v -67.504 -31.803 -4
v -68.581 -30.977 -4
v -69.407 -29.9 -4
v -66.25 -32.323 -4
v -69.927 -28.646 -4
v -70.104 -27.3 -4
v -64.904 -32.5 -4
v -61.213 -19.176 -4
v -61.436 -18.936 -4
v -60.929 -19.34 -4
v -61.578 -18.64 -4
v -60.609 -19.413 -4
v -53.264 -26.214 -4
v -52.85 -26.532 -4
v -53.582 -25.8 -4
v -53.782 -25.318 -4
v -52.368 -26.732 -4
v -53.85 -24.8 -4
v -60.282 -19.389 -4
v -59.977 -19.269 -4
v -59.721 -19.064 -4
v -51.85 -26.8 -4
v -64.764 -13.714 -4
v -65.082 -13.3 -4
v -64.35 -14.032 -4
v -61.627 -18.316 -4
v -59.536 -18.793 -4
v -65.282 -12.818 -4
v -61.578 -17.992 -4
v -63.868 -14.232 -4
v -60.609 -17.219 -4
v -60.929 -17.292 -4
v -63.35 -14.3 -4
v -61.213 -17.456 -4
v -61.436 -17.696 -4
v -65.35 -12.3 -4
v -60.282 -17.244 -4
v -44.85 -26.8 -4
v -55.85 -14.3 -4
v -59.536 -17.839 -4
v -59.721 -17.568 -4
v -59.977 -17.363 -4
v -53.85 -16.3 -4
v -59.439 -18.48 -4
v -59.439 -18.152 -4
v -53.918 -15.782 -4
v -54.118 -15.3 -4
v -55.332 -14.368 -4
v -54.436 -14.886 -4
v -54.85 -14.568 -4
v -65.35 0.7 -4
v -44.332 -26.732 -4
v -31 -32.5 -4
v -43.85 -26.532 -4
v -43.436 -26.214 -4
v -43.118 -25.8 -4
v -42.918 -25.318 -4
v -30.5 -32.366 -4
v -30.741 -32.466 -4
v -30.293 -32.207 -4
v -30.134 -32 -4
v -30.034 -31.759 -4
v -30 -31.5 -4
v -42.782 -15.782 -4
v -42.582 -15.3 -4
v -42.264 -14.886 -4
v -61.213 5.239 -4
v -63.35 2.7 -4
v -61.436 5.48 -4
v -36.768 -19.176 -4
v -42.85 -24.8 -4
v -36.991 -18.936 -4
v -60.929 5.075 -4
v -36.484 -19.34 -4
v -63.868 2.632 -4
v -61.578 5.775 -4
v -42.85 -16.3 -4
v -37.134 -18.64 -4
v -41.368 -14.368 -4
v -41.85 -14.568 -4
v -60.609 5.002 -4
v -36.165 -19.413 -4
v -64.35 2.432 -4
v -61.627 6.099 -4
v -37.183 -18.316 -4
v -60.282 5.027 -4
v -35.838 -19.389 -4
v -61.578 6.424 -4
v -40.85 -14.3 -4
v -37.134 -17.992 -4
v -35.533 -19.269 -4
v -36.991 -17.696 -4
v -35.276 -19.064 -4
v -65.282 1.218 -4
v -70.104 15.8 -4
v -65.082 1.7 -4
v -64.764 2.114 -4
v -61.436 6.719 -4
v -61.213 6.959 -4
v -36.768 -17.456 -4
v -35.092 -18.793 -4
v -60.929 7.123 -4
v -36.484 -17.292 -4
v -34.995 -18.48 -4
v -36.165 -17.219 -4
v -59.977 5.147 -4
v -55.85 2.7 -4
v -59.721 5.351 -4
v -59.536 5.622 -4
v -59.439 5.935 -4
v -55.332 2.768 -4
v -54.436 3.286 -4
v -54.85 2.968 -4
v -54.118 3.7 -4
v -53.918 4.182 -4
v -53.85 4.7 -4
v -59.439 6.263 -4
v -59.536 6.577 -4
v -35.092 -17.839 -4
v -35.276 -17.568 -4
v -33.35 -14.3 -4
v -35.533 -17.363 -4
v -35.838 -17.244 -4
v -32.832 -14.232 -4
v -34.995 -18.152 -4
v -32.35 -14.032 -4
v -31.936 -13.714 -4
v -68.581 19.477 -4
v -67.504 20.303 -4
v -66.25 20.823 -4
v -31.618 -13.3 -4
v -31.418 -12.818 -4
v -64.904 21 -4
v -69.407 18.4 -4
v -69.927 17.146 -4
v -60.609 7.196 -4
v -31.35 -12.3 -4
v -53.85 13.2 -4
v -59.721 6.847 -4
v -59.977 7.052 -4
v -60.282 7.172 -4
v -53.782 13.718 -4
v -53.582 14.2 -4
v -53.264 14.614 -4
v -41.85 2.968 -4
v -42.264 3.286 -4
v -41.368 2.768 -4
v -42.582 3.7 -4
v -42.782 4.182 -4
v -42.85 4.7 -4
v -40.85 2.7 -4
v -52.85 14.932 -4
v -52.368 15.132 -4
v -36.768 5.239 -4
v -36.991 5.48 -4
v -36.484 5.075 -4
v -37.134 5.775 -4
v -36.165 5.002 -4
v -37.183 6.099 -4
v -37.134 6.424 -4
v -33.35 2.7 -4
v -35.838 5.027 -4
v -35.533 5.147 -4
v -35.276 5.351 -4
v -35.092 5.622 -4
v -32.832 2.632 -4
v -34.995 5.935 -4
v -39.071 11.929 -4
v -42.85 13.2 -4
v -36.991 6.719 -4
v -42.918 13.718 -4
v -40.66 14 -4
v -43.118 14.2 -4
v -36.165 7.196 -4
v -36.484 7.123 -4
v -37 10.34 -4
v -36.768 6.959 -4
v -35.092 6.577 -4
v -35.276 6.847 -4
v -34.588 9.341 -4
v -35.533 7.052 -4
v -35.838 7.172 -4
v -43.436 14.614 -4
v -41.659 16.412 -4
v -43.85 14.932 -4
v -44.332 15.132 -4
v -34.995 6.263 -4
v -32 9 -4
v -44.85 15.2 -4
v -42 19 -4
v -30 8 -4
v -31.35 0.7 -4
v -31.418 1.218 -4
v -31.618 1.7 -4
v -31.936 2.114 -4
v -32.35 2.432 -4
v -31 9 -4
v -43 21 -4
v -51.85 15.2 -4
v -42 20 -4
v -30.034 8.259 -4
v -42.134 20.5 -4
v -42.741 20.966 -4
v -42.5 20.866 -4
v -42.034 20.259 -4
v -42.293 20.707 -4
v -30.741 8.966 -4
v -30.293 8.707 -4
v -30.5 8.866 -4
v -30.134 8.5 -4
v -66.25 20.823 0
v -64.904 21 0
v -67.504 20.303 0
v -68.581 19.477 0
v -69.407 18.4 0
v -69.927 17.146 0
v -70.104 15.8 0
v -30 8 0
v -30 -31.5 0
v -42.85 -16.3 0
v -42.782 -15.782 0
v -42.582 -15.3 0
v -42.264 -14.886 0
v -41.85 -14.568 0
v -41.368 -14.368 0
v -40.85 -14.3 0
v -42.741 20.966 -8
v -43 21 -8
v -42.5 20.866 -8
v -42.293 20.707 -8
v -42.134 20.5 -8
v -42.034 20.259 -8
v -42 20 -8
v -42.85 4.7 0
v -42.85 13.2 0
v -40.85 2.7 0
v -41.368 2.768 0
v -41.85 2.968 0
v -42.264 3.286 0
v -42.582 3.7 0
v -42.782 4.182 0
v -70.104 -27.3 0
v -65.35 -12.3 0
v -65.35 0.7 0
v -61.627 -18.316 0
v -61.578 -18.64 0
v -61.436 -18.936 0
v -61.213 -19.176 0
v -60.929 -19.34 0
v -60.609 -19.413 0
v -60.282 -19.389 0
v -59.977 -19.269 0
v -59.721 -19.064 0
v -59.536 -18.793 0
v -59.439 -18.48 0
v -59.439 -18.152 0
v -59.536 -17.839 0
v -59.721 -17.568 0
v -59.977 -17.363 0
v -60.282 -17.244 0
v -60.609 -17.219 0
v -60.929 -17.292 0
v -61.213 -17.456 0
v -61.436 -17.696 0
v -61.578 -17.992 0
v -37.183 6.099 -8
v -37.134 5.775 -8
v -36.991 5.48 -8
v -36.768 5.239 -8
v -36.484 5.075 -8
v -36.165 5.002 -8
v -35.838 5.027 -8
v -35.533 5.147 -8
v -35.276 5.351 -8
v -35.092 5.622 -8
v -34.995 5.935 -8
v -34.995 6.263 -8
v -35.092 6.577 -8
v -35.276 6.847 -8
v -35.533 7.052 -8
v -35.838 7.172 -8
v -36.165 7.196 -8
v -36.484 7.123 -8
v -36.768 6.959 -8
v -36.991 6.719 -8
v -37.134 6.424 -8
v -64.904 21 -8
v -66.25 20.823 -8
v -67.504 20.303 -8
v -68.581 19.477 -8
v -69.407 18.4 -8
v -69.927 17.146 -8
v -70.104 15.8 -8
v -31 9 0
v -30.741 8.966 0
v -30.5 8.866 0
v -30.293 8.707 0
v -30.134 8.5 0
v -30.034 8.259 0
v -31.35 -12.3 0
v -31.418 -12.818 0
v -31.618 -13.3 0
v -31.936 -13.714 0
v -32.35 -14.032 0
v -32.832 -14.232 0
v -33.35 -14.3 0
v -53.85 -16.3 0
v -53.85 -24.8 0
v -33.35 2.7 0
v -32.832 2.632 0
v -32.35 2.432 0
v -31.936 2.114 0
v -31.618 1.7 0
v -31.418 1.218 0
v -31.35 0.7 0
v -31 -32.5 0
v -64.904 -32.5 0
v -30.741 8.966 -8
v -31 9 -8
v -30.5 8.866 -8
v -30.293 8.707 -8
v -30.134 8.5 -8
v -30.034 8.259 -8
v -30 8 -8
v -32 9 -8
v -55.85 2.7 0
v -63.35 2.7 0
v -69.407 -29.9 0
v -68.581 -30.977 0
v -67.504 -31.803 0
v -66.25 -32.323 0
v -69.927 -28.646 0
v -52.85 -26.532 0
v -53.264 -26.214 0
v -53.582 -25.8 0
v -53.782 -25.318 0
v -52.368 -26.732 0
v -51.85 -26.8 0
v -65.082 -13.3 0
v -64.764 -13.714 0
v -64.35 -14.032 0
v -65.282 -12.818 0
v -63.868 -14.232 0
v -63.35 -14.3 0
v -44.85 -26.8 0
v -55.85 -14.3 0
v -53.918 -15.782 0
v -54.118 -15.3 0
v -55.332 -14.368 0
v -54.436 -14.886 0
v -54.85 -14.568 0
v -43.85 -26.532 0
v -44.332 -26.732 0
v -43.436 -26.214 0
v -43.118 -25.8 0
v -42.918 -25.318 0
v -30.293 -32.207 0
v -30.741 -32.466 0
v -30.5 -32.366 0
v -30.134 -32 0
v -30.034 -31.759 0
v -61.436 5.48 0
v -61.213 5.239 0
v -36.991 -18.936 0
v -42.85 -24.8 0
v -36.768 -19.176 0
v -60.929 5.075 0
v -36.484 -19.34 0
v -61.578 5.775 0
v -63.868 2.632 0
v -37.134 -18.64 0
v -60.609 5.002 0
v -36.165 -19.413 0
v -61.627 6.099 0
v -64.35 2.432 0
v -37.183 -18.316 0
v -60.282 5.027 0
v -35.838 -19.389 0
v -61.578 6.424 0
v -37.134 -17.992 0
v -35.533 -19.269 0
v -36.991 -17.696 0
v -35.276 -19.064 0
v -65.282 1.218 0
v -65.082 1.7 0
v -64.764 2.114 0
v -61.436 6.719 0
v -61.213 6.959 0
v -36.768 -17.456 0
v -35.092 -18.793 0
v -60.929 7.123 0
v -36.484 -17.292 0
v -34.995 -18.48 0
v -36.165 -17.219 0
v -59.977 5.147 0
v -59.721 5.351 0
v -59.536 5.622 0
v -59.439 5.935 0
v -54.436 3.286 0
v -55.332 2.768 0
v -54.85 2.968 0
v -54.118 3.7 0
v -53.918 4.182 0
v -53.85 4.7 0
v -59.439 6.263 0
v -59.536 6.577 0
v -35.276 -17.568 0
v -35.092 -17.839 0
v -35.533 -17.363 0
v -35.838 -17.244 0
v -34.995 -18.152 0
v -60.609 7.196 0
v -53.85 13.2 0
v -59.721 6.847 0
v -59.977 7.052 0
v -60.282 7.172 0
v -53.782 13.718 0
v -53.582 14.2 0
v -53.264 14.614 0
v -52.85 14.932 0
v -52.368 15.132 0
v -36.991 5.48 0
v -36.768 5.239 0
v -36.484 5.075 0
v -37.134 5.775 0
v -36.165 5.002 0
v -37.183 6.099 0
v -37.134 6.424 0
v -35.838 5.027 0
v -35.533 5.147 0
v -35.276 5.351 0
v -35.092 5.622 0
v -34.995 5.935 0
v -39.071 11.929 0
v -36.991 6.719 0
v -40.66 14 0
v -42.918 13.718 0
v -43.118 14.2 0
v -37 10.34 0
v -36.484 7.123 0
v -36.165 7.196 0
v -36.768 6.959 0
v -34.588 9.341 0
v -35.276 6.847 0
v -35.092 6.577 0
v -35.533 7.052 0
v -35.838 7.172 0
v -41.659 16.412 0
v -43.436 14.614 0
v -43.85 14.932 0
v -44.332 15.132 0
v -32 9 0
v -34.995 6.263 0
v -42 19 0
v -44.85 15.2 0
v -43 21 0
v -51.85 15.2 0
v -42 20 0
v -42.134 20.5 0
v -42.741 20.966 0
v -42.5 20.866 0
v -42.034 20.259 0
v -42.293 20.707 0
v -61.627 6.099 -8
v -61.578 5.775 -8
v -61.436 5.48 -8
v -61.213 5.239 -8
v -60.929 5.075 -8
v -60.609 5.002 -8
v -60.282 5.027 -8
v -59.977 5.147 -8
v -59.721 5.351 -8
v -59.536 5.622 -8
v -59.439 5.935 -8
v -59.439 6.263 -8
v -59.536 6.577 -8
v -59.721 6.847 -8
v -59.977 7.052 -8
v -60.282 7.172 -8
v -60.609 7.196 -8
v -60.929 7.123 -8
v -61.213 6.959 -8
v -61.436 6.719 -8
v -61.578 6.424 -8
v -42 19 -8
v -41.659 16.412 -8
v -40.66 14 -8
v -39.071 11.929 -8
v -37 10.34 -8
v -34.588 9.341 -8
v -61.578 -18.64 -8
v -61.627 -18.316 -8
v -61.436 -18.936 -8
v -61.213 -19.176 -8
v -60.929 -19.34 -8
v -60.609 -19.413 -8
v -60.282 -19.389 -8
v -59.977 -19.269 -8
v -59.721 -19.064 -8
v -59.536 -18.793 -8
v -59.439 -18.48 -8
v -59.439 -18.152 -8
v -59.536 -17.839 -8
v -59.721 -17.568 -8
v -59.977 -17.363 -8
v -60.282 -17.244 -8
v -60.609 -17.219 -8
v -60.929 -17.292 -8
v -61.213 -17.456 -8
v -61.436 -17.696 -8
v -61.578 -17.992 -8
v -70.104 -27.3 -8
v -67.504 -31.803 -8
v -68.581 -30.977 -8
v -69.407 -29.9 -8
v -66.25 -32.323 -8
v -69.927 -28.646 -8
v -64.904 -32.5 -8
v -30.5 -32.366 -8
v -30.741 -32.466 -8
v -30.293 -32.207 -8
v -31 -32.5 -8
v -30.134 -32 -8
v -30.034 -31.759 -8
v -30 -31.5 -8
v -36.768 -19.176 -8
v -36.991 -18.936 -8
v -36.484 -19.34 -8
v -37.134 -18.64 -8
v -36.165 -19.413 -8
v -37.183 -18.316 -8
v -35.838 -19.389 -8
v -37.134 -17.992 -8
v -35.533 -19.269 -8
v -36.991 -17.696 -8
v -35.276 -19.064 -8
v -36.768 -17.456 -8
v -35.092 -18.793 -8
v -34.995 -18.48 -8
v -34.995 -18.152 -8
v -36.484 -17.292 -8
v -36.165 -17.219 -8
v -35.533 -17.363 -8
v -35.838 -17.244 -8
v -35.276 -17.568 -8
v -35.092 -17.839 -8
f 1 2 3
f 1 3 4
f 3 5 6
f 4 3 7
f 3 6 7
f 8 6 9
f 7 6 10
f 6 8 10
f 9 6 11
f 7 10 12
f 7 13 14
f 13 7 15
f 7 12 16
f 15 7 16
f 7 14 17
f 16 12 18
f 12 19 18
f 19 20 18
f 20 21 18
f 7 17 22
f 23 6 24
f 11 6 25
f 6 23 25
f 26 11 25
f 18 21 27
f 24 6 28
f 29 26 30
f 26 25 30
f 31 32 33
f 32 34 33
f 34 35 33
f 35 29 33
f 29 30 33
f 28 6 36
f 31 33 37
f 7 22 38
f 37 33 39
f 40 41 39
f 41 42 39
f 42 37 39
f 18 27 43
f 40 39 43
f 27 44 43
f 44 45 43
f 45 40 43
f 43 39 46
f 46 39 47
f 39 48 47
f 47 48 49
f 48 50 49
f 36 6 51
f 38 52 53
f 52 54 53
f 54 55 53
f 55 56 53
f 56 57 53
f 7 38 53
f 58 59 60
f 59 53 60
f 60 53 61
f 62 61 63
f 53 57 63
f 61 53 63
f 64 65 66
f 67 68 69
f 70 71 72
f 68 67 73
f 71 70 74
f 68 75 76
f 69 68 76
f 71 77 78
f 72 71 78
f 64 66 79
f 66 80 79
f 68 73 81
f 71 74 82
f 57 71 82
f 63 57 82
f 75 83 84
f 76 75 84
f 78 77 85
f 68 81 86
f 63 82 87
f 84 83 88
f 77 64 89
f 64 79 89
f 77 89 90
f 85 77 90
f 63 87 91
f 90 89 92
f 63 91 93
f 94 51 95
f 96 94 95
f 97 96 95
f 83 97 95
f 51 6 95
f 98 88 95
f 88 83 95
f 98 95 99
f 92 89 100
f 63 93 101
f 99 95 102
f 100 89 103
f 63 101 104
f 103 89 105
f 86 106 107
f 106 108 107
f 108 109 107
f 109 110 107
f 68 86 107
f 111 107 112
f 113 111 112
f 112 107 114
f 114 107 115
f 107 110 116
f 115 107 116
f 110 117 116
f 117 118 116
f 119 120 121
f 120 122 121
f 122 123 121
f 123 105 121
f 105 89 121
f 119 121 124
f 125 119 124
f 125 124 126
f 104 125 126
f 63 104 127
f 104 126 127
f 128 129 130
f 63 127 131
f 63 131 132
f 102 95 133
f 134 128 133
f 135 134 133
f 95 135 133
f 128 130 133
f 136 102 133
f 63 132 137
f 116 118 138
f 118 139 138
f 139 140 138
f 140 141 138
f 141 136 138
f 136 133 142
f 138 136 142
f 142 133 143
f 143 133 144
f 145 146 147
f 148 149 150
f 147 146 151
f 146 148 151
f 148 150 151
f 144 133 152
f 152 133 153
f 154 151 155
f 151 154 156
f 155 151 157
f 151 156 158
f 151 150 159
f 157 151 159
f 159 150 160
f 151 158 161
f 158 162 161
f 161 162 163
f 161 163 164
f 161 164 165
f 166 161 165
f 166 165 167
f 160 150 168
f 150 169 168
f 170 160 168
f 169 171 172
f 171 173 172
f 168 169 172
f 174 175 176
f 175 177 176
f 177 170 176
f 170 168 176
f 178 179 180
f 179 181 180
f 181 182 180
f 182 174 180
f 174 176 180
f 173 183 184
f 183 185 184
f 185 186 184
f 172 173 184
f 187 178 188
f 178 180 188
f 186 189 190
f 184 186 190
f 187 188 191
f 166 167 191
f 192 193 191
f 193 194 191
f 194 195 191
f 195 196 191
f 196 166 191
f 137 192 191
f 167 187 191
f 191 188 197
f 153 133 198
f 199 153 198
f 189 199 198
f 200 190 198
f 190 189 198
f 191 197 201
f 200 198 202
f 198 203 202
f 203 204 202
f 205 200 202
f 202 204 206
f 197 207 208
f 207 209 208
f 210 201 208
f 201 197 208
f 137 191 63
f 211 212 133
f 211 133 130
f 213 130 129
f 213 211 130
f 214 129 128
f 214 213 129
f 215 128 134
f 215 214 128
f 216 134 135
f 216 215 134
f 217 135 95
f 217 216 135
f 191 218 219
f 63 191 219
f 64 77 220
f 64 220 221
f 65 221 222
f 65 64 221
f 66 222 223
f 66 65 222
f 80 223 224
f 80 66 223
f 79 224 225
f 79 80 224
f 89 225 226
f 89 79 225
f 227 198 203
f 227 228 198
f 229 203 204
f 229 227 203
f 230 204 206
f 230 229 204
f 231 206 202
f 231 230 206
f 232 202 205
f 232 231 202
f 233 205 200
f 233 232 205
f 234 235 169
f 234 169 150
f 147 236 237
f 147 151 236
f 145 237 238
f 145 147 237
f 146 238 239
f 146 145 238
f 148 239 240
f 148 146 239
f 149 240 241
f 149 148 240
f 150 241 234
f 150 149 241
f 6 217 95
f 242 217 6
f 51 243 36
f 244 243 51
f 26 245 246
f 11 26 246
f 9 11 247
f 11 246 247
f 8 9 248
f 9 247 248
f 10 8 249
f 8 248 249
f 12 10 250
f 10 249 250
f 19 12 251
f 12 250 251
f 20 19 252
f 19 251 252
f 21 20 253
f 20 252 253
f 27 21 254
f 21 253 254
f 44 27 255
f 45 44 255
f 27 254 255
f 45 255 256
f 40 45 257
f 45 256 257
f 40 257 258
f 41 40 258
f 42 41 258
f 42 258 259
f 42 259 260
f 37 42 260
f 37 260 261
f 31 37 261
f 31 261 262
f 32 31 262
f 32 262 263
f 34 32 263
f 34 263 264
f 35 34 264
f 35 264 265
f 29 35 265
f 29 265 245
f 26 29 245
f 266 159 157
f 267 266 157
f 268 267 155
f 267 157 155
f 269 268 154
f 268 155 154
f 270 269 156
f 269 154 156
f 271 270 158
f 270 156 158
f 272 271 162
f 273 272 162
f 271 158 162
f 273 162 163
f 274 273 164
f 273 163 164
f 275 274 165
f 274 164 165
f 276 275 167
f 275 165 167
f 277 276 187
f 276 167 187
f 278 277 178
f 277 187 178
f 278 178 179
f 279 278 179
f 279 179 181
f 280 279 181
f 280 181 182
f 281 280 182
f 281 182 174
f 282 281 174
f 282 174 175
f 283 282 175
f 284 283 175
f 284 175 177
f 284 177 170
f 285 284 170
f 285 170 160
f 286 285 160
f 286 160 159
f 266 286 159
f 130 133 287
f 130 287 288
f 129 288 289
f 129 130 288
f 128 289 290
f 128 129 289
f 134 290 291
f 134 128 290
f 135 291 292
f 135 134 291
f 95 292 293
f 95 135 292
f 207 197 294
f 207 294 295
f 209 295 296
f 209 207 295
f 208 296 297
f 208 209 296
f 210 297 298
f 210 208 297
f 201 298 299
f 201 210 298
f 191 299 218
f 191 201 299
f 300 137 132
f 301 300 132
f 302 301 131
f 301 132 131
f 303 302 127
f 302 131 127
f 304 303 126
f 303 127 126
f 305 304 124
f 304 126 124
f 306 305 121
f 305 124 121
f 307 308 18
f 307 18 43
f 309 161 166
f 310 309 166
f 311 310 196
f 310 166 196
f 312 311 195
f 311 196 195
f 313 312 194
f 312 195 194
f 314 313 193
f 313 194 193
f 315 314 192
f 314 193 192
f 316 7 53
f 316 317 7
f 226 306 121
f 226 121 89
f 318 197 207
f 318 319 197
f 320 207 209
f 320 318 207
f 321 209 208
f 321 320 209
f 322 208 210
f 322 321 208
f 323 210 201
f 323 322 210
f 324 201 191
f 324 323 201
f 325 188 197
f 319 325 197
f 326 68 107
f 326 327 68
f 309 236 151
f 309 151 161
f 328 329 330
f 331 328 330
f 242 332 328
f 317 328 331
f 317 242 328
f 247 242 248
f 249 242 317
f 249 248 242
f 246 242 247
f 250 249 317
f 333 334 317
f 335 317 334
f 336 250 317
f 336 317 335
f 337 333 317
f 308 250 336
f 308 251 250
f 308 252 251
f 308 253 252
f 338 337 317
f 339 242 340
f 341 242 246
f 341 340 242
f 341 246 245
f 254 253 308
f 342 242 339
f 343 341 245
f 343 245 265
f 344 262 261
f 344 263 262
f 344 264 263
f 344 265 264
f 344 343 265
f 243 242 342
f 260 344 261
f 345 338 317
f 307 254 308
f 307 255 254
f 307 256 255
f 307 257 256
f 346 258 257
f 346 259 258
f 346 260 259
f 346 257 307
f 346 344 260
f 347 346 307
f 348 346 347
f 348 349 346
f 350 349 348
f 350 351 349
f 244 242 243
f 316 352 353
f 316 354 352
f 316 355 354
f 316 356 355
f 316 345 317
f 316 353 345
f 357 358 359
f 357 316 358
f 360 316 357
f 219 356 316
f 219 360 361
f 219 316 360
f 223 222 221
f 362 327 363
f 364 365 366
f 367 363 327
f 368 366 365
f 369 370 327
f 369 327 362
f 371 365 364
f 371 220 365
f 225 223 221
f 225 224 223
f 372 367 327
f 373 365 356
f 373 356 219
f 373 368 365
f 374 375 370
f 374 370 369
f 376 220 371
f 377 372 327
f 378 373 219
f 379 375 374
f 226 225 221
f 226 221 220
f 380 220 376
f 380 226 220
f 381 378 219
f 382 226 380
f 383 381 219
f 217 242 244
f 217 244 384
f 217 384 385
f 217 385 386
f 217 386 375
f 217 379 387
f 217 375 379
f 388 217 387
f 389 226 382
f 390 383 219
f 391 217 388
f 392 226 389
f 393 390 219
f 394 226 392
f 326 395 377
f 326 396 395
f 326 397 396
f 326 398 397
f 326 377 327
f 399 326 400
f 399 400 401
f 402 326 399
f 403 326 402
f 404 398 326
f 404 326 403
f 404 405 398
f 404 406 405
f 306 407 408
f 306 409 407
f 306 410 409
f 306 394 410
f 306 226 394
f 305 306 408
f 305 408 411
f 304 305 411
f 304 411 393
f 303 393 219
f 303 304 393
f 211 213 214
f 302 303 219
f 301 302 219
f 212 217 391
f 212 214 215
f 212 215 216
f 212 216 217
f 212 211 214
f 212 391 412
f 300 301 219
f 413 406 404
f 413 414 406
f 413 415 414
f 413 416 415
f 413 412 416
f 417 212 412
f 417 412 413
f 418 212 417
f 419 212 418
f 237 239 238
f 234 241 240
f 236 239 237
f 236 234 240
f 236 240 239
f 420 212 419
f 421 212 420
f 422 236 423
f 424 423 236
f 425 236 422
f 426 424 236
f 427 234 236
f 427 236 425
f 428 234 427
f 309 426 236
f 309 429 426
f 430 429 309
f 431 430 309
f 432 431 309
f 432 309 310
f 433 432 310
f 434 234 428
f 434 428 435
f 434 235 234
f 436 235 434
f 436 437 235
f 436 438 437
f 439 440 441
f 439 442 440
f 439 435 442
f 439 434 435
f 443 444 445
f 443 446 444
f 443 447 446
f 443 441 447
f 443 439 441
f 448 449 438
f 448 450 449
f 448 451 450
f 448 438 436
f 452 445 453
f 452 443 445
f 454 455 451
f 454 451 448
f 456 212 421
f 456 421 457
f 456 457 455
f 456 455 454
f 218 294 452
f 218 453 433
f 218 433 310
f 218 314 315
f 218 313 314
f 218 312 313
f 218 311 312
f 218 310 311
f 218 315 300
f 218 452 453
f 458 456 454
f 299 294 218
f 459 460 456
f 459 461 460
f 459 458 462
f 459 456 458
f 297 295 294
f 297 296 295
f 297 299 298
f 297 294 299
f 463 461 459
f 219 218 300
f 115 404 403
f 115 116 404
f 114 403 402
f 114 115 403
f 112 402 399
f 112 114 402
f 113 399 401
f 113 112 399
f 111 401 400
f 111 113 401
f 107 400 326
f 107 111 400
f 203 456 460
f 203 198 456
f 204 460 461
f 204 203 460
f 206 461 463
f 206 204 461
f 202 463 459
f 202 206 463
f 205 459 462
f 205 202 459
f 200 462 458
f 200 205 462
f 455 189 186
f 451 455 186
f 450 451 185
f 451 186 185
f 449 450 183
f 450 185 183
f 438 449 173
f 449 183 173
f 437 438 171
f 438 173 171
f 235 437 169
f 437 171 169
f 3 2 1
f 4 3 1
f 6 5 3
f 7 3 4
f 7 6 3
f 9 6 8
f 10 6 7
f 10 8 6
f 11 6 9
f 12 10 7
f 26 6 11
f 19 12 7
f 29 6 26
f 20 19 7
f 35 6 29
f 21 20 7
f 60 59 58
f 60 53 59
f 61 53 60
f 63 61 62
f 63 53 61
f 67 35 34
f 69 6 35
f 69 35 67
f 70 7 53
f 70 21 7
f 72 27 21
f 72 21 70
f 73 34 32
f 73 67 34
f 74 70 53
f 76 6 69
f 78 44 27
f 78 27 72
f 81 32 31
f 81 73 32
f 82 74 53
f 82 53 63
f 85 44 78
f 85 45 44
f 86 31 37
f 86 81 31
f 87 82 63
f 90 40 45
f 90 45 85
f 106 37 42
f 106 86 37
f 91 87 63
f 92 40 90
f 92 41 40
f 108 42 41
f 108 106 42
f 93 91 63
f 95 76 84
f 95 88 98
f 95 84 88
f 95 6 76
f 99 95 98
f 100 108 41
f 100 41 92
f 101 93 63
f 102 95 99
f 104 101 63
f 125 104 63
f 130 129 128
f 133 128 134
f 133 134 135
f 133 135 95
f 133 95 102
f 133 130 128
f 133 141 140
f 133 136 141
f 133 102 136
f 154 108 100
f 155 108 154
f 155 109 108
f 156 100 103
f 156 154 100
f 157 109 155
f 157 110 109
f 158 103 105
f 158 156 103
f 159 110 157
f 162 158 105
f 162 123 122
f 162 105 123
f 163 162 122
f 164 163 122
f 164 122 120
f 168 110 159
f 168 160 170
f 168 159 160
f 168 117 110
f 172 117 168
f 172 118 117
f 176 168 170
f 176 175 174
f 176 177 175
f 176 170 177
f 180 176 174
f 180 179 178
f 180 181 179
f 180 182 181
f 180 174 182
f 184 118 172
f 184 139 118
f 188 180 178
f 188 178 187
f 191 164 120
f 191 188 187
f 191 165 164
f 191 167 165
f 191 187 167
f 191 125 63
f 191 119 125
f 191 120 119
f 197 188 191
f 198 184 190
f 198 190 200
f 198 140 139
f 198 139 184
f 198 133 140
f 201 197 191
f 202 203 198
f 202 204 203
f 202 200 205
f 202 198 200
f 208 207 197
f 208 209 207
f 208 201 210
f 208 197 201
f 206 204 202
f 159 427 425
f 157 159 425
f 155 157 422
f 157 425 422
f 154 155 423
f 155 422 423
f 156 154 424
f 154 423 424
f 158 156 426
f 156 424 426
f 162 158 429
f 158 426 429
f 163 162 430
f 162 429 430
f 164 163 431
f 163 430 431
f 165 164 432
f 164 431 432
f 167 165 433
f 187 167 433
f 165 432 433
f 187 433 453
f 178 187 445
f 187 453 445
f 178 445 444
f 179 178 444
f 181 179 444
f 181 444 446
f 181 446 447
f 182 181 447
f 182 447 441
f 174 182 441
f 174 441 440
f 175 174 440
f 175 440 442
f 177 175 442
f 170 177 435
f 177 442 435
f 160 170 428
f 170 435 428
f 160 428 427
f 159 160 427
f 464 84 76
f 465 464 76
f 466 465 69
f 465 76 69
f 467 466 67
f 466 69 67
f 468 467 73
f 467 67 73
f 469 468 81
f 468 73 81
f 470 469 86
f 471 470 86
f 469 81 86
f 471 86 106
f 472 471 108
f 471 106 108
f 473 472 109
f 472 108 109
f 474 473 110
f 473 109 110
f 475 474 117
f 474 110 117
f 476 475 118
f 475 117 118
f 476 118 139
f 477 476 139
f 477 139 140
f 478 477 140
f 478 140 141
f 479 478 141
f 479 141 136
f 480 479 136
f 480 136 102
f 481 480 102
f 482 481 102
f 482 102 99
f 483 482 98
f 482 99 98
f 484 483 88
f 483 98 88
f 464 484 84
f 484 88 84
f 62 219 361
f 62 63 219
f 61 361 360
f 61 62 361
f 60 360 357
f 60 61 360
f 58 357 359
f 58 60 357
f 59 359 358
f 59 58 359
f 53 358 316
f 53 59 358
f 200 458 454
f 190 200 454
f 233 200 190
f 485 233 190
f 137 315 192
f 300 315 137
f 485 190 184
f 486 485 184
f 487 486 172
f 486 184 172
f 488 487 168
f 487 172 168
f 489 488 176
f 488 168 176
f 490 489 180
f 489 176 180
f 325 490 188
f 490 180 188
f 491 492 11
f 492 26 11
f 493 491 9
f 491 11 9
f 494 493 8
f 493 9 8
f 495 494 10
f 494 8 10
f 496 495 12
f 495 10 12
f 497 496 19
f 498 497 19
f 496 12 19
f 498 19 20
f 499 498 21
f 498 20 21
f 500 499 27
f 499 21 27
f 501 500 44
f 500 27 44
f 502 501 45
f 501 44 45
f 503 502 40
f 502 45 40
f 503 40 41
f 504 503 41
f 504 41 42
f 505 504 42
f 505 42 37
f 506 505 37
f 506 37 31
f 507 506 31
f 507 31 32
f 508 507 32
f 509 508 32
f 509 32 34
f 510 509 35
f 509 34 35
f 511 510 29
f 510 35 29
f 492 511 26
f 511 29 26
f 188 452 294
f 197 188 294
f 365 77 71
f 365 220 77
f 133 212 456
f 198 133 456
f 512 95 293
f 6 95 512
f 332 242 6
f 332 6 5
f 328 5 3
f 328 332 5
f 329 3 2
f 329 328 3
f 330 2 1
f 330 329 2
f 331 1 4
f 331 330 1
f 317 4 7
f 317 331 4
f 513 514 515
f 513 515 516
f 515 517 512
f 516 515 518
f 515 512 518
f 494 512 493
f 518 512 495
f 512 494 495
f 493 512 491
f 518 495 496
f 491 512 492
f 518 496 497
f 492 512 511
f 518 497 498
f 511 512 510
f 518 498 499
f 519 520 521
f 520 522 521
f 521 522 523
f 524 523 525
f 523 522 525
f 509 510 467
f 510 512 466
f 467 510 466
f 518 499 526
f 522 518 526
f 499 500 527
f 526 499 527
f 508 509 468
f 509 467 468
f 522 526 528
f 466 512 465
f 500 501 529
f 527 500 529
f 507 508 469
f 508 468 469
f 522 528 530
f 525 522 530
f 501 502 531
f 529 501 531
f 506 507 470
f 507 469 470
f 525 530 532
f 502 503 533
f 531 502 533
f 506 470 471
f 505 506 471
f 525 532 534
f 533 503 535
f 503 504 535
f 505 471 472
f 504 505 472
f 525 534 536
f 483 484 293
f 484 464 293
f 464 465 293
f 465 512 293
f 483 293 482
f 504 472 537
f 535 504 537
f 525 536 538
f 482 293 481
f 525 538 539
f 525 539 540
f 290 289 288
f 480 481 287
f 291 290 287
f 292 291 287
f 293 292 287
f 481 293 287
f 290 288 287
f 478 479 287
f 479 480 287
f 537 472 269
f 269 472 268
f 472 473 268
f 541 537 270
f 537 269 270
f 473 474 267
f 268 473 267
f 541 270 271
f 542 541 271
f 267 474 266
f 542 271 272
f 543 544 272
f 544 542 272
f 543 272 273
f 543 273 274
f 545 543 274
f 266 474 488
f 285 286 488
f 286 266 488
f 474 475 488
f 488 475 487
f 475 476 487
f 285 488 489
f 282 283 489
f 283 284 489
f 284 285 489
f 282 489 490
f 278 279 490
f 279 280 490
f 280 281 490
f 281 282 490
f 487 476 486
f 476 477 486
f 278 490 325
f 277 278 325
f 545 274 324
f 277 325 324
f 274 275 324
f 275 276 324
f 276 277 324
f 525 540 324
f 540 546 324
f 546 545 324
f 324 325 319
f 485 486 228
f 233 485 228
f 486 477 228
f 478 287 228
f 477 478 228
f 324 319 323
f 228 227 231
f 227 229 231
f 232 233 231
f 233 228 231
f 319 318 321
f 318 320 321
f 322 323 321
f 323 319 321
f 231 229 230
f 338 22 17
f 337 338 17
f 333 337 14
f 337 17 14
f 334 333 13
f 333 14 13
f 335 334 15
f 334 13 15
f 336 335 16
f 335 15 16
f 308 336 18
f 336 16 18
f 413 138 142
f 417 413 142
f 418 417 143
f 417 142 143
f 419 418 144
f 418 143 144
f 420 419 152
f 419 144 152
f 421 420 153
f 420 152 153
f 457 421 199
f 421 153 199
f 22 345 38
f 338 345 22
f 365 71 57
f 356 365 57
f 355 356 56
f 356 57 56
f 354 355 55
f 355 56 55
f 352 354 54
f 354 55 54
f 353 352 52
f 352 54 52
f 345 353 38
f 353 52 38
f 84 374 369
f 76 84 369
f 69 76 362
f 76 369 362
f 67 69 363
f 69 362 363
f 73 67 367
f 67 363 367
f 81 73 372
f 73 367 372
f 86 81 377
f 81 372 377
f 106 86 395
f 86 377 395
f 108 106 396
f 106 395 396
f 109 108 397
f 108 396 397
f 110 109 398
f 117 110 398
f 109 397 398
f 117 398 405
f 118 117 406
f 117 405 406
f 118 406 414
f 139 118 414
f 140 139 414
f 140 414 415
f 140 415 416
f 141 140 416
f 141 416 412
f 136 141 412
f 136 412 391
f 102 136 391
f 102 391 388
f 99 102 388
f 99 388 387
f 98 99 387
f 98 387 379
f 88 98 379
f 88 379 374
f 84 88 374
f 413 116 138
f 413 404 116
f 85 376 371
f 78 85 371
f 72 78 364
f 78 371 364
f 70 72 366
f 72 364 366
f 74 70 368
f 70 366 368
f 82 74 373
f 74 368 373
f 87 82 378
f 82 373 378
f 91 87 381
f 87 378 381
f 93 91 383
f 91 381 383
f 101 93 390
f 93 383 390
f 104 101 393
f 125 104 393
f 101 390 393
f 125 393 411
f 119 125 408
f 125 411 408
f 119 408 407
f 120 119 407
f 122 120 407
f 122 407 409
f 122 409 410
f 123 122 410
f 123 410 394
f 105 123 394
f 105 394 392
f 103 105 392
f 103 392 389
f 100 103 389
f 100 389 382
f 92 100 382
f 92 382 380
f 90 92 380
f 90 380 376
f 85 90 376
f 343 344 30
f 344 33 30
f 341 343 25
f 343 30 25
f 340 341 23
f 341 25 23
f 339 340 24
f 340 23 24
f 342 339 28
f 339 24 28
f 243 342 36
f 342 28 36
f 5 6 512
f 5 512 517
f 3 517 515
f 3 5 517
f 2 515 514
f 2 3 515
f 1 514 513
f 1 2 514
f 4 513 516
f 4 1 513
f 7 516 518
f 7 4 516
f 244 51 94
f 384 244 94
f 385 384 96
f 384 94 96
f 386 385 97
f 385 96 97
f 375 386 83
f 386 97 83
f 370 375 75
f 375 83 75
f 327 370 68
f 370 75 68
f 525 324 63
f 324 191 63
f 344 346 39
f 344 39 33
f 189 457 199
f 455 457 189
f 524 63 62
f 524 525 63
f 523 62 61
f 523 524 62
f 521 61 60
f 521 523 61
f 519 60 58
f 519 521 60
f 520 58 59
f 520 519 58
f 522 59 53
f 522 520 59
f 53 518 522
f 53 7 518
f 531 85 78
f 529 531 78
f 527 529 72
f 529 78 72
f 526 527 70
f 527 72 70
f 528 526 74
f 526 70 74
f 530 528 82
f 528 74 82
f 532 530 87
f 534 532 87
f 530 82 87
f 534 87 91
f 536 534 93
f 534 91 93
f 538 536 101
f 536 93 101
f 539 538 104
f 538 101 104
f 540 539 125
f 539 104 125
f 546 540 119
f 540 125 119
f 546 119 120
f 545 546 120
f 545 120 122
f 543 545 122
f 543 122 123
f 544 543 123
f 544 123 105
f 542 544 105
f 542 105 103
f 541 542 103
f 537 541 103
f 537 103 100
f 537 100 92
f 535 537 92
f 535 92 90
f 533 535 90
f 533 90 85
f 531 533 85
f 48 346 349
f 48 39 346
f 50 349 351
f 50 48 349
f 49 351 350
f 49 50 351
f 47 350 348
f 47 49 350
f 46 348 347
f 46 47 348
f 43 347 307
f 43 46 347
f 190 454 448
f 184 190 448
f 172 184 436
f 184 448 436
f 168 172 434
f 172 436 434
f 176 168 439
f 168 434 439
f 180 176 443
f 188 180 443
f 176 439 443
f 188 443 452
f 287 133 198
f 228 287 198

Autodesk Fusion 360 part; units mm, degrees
sketch "Sketch2" plane through (0, 0, 0) normal (0, 0, 1) x (1, 0, 0)
  line L0 (70.104, -32.512) -> (-70.104, -32.512)
  line L1 (-70.104, -32.512) -> (-70.104, 32.512)
  line L2 (-70.104, 32.512) -> (70.104, 32.512)
  line L3 (70.104, 32.512) -> (70.104, -32.512)
  line L4 (70.104, -32.512) -> (-70.104, 32.512) construction
  line L5 (-70.104, -32.512) -> (70.104, 32.512) construction
  dimension "d1" = 140.208
  dimension "d2" = 65.024
sketch "Sketch3" plane through (0, 0, 0) normal (0, 0, 1) x (1, 0, 0)
  line L0 (-70.104, 15.8) -> (-70.104, -27.3)
  arc A0 (-70.104, -27.3) -> (-64.904, -32.5) centre (-64.904, -27.3) ccw
  line L1 (-64.904, -32.5) -> (-30, -32.5)
  arc A1 (-64.904, 21) -> (-70.104, 15.8) centre (-64.904, 15.8) ccw
  line L2 (-64.904, 21) -> (-42, 21)
  line L3 (-30, 9) -> (-30, -32.5)
  circle A2 centre (-30.5373, 18.3875) radius 8
  line L4 (-30.5373, 22.2562) -> (-30.5373, 14.5188)
  line L5 (-42, 21) -> (-42, 19)
  arc A3 (-42, 19) -> (-32, 9) centre (-32, 19) ccw
  line L6 (-32, 9) -> (-30, 9)
  dimension "d3" = 70.104
  dimension "d4" = 32.5
  dimension "d5" = 5.2
  dimension "d6" = 21
  dimension "d7" = 5.2
  dimension "d8" = 16
  dimension "d9" = 42
  dimension "d10" = 9
  dimension "d11" = 10
  dimension "d12" = 30
extrude "Extrude1" add sketch "Sketch3" against normal blind 4 contours L0 A0 L1 A1 L2 L3 L5 A3 L6 makes body 1
fillet "Fillet3" radius 1 3 edges at (-30, -32.5, -2) (-30, 9, -2) (-42, 21, -2) on bodies 1
pattern_linear "R-Pattern1" count 2 spacing 4 along (0, 0, -1) of bodies 1 makes body 2
sketch "Sketch4" plane through (0, 0, 0) normal (0, 0, 1) x (-1, 0, 0)
  arc A0 (64.904, -21) -> (70.104, -15.8) centre (64.904, -15.8) ccw
  line L0 (70.104, -15.8) -> (70.104, 27.3)
  arc A1 (70.104, 27.3) -> (64.904, 32.5) centre (64.904, 27.3) ccw
  line L1 (64.904, 32.5) -> (31, 32.5)
  line L2 (30, 31.5) -> (30, -8)
  line L3 (31, -9) -> (32, -9)
  arc A2 (42, -19) -> (32, -9) centre (32, -19) ccw
  line L4 (42, -19) -> (42, -20)
  line L5 (43, -21) -> (64.904, -21)
  line L6 (65.35, -2.7) -> (48.35, -2.7)
  line L7 (48.35, -2.7) -> (48.35, 14.3)
  line L8 (48.35, 14.3) -> (65.35, 14.3)
  line L9 (65.35, 14.3) -> (65.35, -2.7)
  arc A3 (42, -20) -> (43, -21) centre (43, -20) ccw
  arc A4 (31, 32.5) -> (30, 31.5) centre (31, 31.5) ccw
  arc A5 (30, -8) -> (31, -9) centre (31, -8) ccw
  point P0 (48.35, 5.8)
  dimension "d21" = 5.8
  dimension "d22" = 17
  dimension "d23" = 48.35
  dimension "d24" = 17
extrude "Extrude2" cut sketch "Sketch4" against normal blind 4 contours L6 L7 L8 L9 bodies 1
fillet "Fillet1" radius 2 2 edges at (-65.35, 2.7, -2) (-65.35, -14.3, -2) on bodies 1
mirror "Mirror1" about plane through (-48.35, 2.7, 0) normal (-1, 0, 0) of "Extrude2", "Fillet1"
sketch "Sketch5" plane through (0, 0, 0) normal (0, 0, 1) x (-1, 0, 0)
  line L0 (33.35, 14.3) -> (63.35, 14.3)
  arc A0 (65.35, 12.3) -> (63.35, 14.3) centre (63.35, 12.3) ccw
  line L1 (65.35, 12.3) -> (65.35, -0.7)
  arc A1 (63.35, -2.7) -> (65.35, -0.7) centre (63.35, -0.7) ccw
  line L2 (63.35, -2.7) -> (33.35, -2.7)
  arc A2 (31.35, -0.7) -> (33.35, -2.7) centre (33.35, -0.7) ccw
  line L3 (31.35, -0.7) -> (31.35, 12.3)
  arc A3 (33.35, 14.3) -> (31.35, 12.3) centre (33.35, 12.3) ccw
  arc A4 (42, -20) -> (43, -21) centre (43, -20) ccw
  line L4 (43, -21) -> (64.904, -21)
  arc A5 (64.904, -21) -> (70.104, -15.8) centre (64.904, -15.8) ccw
  line L5 (70.104, -15.8) -> (70.104, 27.3)
  arc A6 (70.104, 27.3) -> (64.904, 32.5) centre (64.904, 27.3) ccw
  line L6 (64.904, 32.5) -> (31, 32.5)
  arc A7 (31, 32.5) -> (30, 31.5) centre (31, 31.5) ccw
  line L7 (30, 31.5) -> (30, -8)
  arc A8 (30, -8) -> (31, -9) centre (31, -8) ccw
  line L8 (31, -9) -> (32, -9)
  arc A9 (42, -19) -> (32, -9) centre (32, -19) ccw
  line L9 (42, -19) -> (42, -20)
  line L10 (53.85, -2.7) -> (53.85, -15.2)
  line L11 (53.85, -15.2) -> (42.85, -15.2)
  line L12 (42.85, -15.2) -> (42.85, -2.7)
  point P0 (48.35, -2.7)
  point P1 (48.35, -15.2)
  dimension "d37" = 12.5
  dimension "d38" = 11
extrude "Extrude3" cut sketch "Sketch5" against normal blind 4 contours L2 L10 L11 L12 bodies 1
fillet "Fillet4" radius 2 2 edges at (-53.85, 15.2, -2) (-42.85, 15.2, -2) on bodies 1
ref_plane "WorkPlane1" through (-58.1, -5.8, -2) normal (0, -1, 0) x (-1, 0, 0)
mirror "Mirror2" about plane through (-58.1, -5.8, -2) normal (0, -1, 0) of "Extrude3", "Fillet4"
sketch "Sketch6" plane through (0, 0, 0) normal (0, 0, 1) x (-1, 0, 0)
  line L0 (53.85, 24.8) -> (53.85, 14.3)
  line L1 (53.85, 14.3) -> (63.35, 14.3)
  arc A0 (65.35, 12.3) -> (63.35, 14.3) centre (63.35, 12.3) ccw
  line L2 (65.35, 12.3) -> (65.35, -0.7)
  arc A1 (63.35, -2.7) -> (65.35, -0.7) centre (63.35, -0.7) ccw
  line L3 (63.35, -2.7) -> (53.85, -2.7)
  line L4 (53.85, -2.7) -> (53.85, -13.2)
  arc A2 (51.85, -15.2) -> (53.85, -13.2) centre (51.85, -13.2) ccw
  line L5 (51.85, -15.2) -> (44.85, -15.2)
  arc A3 (42.85, -13.2) -> (44.85, -15.2) centre (44.85, -13.2) ccw
  line L6 (42.85, -13.2) -> (42.85, -2.7)
  line L7 (42.85, -2.7) -> (33.35, -2.7)
  arc A4 (31.35, -0.7) -> (33.35, -2.7) centre (33.35, -0.7) ccw
  line L8 (31.35, -0.7) -> (31.35, 12.3)
  arc A5 (33.35, 14.3) -> (31.35, 12.3) centre (33.35, 12.3) ccw
  line L9 (33.35, 14.3) -> (42.85, 14.3)
  line L10 (42.85, 14.3) -> (42.85, 24.8)
  arc A6 (44.85, 26.8) -> (42.85, 24.8) centre (44.85, 24.8) ccw
  line L11 (44.85, 26.8) -> (51.85, 26.8)
  arc A7 (53.85, 24.8) -> (51.85, 26.8) centre (51.85, 24.8) ccw
  arc A8 (42, -20) -> (43, -21) centre (43, -20) ccw
  line L12 (43, -21) -> (64.904, -21)
  arc A9 (64.904, -21) -> (70.104, -15.8) centre (64.904, -15.8) ccw
  line L13 (70.104, -15.8) -> (70.104, 27.3)
  arc A10 (70.104, 27.3) -> (64.904, 32.5) centre (64.904, 27.3) ccw
  line L14 (64.904, 32.5) -> (31, 32.5)
  arc A11 (31, 32.5) -> (30, 31.5) centre (31, 31.5) ccw
  line L15 (30, 31.5) -> (30, -8)
  arc A12 (30, -8) -> (31, -9) centre (31, -8) ccw
  line L16 (31, -9) -> (32, -9)
  arc A13 (42, -19) -> (32, -9) centre (32, -19) ccw
  line L17 (42, -19) -> (42, -20)
  circle A14 centre (60.5272, -6.0993) radius 1.1
  circle A15 centre (36.0826, -6.0993) radius 1.1
  line L18 (60.5272, -6.0993) -> (36.0826, -6.0993) construction
  line L19 (36.0826, -6.0993) -> (36.0826, 18.3161) construction
  line L20 (36.0826, 18.3161) -> (60.5272, 18.3161) construction
  line L21 (60.5272, 18.3161) -> (60.5272, -6.0993) construction
  circle A16 centre (60.5272, 18.3161) radius 1.1
  circle A17 centre (36.0826, 18.3161) radius 1.1
  dimension "d45" = 2.2
  dimension "d46" = 2.2
  dimension "d47" = 2.2
  dimension "d48" = 2.2
extrude "Extrude4" cut sketch "Sketch6" against normal blind 18 contours A14 | A15 | A16 | A17 bodies 1 2
fillet "Fillet5" radius 2 4 edges at (-53.85, 2.7, -2) (-53.85, -14.3, -2) (-42.85, -14.3, -2) (-42.85, 2.7, -2) on bodies 1
sketch "Sketch10" plane through (0, 0, 0) normal (0, 0, 1) x (-1, 0, 0)
  arc A0 (42.85, -4.7) -> (40.85, -2.7) centre (40.85, -4.7) ccw
  line L0 (40.85, -2.7) -> (33.35, -2.7)
  arc A1 (31.35, -0.7) -> (33.35, -2.7) centre (33.35, -0.7) ccw
  line L1 (31.35, -0.7) -> (31.35, 12.3)
  arc A2 (33.35, 14.3) -> (31.35, 12.3) centre (33.35, 12.3) ccw
  line L2 (33.35, 14.3) -> (40.85, 14.3)
  arc A3 (40.85, 14.3) -> (42.85, 16.3) centre (40.85, 16.3) ccw
  line L3 (42.85, 16.3) -> (42.85, 24.8)
  arc A4 (44.85, 26.8) -> (42.85, 24.8) centre (44.85, 24.8) ccw
  line L4 (44.85, 26.8) -> (51.85, 26.8)
  arc A5 (53.85, 24.8) -> (51.85, 26.8) centre (51.85, 24.8) ccw
  line L5 (53.85, 24.8) -> (53.85, 16.3)
  arc A6 (53.85, 16.3) -> (55.85, 14.3) centre (55.85, 16.3) ccw
  line L6 (55.85, 14.3) -> (63.35, 14.3)
  arc A7 (65.35, 12.3) -> (63.35, 14.3) centre (63.35, 12.3) ccw
  line L7 (65.35, 12.3) -> (65.35, -0.7)
  arc A8 (63.35, -2.7) -> (65.35, -0.7) centre (63.35, -0.7) ccw
  line L8 (63.35, -2.7) -> (55.85, -2.7)
  arc A9 (55.85, -2.7) -> (53.85, -4.7) centre (55.85, -4.7) ccw
  line L9 (53.85, -4.7) -> (53.85, -13.2)
  arc A10 (51.85, -15.2) -> (53.85, -13.2) centre (51.85, -13.2) ccw
  line L10 (51.85, -15.2) -> (44.85, -15.2)
  arc A11 (42.85, -13.2) -> (44.85, -15.2) centre (44.85, -13.2) ccw
  line L11 (42.85, -13.2) -> (42.85, -4.7)
  circle A12 centre (60.5272, 18.3161) radius 1.1
  circle A13 centre (36.0826, 18.3161) radius 1.1
  circle A14 centre (60.5272, -6.0993) radius 1.1
  circle A15 centre (36.0826, -6.0993) radius 1.1
  arc A16 (42, -20) -> (43, -21) centre (43, -20) ccw
  line L12 (43, -21) -> (64.904, -21)
  arc A17 (64.904, -21) -> (70.104, -15.8) centre (64.904, -15.8) ccw
  line L13 (70.104, -15.8) -> (70.104, 27.3)
  arc A18 (70.104, 27.3) -> (64.904, 32.5) centre (64.904, 27.3) ccw
  line L14 (64.904, 32.5) -> (31, 32.5)
  arc A19 (31, 32.5) -> (30, 31.5) centre (31, 31.5) ccw
  line L15 (30, 31.5) -> (30, -8)
  arc A20 (30, -8) -> (31, -9) centre (31, -8) ccw
  line L16 (31, -9) -> (32, -9)
  arc A21 (42, -19) -> (32, -9) centre (32, -19) ccw
  line L17 (42, -19) -> (42, -20)
sketch "Sketch11" plane through (0, 0, -4) normal (0, 0, 1) x (-1, 0, 0)
  circle A0 centre (60.5272, 18.3161) radius 1.1
  circle A1 centre (36.0826, 18.3161) radius 1.1
  circle A2 centre (60.5272, -6.0993) radius 1.1
  circle A3 centre (36.0826, -6.0993) radius 1.1
  arc A4 (42, -20) -> (43, -21) centre (43, -20) ccw
  line L0 (43, -21) -> (64.904, -21)
  arc A5 (64.904, -21) -> (70.104, -15.8) centre (64.904, -15.8) ccw
  line L1 (70.104, -15.8) -> (70.104, 27.3)
  arc A6 (70.104, 27.3) -> (64.904, 32.5) centre (64.904, 27.3) ccw
  line L2 (64.904, 32.5) -> (31, 32.5)
  arc A7 (31, 32.5) -> (30, 31.5) centre (31, 31.5) ccw
  line L3 (30, 31.5) -> (30, -8)
  arc A8 (30, -8) -> (31, -9) centre (31, -8) ccw
  line L4 (31, -9) -> (32, -9)
  arc A9 (42, -19) -> (32, -9) centre (32, -19) ccw
  line L5 (42, -19) -> (42, -20)
equation "d3 = ( 140.208 / 2 ) * 1 mm"
